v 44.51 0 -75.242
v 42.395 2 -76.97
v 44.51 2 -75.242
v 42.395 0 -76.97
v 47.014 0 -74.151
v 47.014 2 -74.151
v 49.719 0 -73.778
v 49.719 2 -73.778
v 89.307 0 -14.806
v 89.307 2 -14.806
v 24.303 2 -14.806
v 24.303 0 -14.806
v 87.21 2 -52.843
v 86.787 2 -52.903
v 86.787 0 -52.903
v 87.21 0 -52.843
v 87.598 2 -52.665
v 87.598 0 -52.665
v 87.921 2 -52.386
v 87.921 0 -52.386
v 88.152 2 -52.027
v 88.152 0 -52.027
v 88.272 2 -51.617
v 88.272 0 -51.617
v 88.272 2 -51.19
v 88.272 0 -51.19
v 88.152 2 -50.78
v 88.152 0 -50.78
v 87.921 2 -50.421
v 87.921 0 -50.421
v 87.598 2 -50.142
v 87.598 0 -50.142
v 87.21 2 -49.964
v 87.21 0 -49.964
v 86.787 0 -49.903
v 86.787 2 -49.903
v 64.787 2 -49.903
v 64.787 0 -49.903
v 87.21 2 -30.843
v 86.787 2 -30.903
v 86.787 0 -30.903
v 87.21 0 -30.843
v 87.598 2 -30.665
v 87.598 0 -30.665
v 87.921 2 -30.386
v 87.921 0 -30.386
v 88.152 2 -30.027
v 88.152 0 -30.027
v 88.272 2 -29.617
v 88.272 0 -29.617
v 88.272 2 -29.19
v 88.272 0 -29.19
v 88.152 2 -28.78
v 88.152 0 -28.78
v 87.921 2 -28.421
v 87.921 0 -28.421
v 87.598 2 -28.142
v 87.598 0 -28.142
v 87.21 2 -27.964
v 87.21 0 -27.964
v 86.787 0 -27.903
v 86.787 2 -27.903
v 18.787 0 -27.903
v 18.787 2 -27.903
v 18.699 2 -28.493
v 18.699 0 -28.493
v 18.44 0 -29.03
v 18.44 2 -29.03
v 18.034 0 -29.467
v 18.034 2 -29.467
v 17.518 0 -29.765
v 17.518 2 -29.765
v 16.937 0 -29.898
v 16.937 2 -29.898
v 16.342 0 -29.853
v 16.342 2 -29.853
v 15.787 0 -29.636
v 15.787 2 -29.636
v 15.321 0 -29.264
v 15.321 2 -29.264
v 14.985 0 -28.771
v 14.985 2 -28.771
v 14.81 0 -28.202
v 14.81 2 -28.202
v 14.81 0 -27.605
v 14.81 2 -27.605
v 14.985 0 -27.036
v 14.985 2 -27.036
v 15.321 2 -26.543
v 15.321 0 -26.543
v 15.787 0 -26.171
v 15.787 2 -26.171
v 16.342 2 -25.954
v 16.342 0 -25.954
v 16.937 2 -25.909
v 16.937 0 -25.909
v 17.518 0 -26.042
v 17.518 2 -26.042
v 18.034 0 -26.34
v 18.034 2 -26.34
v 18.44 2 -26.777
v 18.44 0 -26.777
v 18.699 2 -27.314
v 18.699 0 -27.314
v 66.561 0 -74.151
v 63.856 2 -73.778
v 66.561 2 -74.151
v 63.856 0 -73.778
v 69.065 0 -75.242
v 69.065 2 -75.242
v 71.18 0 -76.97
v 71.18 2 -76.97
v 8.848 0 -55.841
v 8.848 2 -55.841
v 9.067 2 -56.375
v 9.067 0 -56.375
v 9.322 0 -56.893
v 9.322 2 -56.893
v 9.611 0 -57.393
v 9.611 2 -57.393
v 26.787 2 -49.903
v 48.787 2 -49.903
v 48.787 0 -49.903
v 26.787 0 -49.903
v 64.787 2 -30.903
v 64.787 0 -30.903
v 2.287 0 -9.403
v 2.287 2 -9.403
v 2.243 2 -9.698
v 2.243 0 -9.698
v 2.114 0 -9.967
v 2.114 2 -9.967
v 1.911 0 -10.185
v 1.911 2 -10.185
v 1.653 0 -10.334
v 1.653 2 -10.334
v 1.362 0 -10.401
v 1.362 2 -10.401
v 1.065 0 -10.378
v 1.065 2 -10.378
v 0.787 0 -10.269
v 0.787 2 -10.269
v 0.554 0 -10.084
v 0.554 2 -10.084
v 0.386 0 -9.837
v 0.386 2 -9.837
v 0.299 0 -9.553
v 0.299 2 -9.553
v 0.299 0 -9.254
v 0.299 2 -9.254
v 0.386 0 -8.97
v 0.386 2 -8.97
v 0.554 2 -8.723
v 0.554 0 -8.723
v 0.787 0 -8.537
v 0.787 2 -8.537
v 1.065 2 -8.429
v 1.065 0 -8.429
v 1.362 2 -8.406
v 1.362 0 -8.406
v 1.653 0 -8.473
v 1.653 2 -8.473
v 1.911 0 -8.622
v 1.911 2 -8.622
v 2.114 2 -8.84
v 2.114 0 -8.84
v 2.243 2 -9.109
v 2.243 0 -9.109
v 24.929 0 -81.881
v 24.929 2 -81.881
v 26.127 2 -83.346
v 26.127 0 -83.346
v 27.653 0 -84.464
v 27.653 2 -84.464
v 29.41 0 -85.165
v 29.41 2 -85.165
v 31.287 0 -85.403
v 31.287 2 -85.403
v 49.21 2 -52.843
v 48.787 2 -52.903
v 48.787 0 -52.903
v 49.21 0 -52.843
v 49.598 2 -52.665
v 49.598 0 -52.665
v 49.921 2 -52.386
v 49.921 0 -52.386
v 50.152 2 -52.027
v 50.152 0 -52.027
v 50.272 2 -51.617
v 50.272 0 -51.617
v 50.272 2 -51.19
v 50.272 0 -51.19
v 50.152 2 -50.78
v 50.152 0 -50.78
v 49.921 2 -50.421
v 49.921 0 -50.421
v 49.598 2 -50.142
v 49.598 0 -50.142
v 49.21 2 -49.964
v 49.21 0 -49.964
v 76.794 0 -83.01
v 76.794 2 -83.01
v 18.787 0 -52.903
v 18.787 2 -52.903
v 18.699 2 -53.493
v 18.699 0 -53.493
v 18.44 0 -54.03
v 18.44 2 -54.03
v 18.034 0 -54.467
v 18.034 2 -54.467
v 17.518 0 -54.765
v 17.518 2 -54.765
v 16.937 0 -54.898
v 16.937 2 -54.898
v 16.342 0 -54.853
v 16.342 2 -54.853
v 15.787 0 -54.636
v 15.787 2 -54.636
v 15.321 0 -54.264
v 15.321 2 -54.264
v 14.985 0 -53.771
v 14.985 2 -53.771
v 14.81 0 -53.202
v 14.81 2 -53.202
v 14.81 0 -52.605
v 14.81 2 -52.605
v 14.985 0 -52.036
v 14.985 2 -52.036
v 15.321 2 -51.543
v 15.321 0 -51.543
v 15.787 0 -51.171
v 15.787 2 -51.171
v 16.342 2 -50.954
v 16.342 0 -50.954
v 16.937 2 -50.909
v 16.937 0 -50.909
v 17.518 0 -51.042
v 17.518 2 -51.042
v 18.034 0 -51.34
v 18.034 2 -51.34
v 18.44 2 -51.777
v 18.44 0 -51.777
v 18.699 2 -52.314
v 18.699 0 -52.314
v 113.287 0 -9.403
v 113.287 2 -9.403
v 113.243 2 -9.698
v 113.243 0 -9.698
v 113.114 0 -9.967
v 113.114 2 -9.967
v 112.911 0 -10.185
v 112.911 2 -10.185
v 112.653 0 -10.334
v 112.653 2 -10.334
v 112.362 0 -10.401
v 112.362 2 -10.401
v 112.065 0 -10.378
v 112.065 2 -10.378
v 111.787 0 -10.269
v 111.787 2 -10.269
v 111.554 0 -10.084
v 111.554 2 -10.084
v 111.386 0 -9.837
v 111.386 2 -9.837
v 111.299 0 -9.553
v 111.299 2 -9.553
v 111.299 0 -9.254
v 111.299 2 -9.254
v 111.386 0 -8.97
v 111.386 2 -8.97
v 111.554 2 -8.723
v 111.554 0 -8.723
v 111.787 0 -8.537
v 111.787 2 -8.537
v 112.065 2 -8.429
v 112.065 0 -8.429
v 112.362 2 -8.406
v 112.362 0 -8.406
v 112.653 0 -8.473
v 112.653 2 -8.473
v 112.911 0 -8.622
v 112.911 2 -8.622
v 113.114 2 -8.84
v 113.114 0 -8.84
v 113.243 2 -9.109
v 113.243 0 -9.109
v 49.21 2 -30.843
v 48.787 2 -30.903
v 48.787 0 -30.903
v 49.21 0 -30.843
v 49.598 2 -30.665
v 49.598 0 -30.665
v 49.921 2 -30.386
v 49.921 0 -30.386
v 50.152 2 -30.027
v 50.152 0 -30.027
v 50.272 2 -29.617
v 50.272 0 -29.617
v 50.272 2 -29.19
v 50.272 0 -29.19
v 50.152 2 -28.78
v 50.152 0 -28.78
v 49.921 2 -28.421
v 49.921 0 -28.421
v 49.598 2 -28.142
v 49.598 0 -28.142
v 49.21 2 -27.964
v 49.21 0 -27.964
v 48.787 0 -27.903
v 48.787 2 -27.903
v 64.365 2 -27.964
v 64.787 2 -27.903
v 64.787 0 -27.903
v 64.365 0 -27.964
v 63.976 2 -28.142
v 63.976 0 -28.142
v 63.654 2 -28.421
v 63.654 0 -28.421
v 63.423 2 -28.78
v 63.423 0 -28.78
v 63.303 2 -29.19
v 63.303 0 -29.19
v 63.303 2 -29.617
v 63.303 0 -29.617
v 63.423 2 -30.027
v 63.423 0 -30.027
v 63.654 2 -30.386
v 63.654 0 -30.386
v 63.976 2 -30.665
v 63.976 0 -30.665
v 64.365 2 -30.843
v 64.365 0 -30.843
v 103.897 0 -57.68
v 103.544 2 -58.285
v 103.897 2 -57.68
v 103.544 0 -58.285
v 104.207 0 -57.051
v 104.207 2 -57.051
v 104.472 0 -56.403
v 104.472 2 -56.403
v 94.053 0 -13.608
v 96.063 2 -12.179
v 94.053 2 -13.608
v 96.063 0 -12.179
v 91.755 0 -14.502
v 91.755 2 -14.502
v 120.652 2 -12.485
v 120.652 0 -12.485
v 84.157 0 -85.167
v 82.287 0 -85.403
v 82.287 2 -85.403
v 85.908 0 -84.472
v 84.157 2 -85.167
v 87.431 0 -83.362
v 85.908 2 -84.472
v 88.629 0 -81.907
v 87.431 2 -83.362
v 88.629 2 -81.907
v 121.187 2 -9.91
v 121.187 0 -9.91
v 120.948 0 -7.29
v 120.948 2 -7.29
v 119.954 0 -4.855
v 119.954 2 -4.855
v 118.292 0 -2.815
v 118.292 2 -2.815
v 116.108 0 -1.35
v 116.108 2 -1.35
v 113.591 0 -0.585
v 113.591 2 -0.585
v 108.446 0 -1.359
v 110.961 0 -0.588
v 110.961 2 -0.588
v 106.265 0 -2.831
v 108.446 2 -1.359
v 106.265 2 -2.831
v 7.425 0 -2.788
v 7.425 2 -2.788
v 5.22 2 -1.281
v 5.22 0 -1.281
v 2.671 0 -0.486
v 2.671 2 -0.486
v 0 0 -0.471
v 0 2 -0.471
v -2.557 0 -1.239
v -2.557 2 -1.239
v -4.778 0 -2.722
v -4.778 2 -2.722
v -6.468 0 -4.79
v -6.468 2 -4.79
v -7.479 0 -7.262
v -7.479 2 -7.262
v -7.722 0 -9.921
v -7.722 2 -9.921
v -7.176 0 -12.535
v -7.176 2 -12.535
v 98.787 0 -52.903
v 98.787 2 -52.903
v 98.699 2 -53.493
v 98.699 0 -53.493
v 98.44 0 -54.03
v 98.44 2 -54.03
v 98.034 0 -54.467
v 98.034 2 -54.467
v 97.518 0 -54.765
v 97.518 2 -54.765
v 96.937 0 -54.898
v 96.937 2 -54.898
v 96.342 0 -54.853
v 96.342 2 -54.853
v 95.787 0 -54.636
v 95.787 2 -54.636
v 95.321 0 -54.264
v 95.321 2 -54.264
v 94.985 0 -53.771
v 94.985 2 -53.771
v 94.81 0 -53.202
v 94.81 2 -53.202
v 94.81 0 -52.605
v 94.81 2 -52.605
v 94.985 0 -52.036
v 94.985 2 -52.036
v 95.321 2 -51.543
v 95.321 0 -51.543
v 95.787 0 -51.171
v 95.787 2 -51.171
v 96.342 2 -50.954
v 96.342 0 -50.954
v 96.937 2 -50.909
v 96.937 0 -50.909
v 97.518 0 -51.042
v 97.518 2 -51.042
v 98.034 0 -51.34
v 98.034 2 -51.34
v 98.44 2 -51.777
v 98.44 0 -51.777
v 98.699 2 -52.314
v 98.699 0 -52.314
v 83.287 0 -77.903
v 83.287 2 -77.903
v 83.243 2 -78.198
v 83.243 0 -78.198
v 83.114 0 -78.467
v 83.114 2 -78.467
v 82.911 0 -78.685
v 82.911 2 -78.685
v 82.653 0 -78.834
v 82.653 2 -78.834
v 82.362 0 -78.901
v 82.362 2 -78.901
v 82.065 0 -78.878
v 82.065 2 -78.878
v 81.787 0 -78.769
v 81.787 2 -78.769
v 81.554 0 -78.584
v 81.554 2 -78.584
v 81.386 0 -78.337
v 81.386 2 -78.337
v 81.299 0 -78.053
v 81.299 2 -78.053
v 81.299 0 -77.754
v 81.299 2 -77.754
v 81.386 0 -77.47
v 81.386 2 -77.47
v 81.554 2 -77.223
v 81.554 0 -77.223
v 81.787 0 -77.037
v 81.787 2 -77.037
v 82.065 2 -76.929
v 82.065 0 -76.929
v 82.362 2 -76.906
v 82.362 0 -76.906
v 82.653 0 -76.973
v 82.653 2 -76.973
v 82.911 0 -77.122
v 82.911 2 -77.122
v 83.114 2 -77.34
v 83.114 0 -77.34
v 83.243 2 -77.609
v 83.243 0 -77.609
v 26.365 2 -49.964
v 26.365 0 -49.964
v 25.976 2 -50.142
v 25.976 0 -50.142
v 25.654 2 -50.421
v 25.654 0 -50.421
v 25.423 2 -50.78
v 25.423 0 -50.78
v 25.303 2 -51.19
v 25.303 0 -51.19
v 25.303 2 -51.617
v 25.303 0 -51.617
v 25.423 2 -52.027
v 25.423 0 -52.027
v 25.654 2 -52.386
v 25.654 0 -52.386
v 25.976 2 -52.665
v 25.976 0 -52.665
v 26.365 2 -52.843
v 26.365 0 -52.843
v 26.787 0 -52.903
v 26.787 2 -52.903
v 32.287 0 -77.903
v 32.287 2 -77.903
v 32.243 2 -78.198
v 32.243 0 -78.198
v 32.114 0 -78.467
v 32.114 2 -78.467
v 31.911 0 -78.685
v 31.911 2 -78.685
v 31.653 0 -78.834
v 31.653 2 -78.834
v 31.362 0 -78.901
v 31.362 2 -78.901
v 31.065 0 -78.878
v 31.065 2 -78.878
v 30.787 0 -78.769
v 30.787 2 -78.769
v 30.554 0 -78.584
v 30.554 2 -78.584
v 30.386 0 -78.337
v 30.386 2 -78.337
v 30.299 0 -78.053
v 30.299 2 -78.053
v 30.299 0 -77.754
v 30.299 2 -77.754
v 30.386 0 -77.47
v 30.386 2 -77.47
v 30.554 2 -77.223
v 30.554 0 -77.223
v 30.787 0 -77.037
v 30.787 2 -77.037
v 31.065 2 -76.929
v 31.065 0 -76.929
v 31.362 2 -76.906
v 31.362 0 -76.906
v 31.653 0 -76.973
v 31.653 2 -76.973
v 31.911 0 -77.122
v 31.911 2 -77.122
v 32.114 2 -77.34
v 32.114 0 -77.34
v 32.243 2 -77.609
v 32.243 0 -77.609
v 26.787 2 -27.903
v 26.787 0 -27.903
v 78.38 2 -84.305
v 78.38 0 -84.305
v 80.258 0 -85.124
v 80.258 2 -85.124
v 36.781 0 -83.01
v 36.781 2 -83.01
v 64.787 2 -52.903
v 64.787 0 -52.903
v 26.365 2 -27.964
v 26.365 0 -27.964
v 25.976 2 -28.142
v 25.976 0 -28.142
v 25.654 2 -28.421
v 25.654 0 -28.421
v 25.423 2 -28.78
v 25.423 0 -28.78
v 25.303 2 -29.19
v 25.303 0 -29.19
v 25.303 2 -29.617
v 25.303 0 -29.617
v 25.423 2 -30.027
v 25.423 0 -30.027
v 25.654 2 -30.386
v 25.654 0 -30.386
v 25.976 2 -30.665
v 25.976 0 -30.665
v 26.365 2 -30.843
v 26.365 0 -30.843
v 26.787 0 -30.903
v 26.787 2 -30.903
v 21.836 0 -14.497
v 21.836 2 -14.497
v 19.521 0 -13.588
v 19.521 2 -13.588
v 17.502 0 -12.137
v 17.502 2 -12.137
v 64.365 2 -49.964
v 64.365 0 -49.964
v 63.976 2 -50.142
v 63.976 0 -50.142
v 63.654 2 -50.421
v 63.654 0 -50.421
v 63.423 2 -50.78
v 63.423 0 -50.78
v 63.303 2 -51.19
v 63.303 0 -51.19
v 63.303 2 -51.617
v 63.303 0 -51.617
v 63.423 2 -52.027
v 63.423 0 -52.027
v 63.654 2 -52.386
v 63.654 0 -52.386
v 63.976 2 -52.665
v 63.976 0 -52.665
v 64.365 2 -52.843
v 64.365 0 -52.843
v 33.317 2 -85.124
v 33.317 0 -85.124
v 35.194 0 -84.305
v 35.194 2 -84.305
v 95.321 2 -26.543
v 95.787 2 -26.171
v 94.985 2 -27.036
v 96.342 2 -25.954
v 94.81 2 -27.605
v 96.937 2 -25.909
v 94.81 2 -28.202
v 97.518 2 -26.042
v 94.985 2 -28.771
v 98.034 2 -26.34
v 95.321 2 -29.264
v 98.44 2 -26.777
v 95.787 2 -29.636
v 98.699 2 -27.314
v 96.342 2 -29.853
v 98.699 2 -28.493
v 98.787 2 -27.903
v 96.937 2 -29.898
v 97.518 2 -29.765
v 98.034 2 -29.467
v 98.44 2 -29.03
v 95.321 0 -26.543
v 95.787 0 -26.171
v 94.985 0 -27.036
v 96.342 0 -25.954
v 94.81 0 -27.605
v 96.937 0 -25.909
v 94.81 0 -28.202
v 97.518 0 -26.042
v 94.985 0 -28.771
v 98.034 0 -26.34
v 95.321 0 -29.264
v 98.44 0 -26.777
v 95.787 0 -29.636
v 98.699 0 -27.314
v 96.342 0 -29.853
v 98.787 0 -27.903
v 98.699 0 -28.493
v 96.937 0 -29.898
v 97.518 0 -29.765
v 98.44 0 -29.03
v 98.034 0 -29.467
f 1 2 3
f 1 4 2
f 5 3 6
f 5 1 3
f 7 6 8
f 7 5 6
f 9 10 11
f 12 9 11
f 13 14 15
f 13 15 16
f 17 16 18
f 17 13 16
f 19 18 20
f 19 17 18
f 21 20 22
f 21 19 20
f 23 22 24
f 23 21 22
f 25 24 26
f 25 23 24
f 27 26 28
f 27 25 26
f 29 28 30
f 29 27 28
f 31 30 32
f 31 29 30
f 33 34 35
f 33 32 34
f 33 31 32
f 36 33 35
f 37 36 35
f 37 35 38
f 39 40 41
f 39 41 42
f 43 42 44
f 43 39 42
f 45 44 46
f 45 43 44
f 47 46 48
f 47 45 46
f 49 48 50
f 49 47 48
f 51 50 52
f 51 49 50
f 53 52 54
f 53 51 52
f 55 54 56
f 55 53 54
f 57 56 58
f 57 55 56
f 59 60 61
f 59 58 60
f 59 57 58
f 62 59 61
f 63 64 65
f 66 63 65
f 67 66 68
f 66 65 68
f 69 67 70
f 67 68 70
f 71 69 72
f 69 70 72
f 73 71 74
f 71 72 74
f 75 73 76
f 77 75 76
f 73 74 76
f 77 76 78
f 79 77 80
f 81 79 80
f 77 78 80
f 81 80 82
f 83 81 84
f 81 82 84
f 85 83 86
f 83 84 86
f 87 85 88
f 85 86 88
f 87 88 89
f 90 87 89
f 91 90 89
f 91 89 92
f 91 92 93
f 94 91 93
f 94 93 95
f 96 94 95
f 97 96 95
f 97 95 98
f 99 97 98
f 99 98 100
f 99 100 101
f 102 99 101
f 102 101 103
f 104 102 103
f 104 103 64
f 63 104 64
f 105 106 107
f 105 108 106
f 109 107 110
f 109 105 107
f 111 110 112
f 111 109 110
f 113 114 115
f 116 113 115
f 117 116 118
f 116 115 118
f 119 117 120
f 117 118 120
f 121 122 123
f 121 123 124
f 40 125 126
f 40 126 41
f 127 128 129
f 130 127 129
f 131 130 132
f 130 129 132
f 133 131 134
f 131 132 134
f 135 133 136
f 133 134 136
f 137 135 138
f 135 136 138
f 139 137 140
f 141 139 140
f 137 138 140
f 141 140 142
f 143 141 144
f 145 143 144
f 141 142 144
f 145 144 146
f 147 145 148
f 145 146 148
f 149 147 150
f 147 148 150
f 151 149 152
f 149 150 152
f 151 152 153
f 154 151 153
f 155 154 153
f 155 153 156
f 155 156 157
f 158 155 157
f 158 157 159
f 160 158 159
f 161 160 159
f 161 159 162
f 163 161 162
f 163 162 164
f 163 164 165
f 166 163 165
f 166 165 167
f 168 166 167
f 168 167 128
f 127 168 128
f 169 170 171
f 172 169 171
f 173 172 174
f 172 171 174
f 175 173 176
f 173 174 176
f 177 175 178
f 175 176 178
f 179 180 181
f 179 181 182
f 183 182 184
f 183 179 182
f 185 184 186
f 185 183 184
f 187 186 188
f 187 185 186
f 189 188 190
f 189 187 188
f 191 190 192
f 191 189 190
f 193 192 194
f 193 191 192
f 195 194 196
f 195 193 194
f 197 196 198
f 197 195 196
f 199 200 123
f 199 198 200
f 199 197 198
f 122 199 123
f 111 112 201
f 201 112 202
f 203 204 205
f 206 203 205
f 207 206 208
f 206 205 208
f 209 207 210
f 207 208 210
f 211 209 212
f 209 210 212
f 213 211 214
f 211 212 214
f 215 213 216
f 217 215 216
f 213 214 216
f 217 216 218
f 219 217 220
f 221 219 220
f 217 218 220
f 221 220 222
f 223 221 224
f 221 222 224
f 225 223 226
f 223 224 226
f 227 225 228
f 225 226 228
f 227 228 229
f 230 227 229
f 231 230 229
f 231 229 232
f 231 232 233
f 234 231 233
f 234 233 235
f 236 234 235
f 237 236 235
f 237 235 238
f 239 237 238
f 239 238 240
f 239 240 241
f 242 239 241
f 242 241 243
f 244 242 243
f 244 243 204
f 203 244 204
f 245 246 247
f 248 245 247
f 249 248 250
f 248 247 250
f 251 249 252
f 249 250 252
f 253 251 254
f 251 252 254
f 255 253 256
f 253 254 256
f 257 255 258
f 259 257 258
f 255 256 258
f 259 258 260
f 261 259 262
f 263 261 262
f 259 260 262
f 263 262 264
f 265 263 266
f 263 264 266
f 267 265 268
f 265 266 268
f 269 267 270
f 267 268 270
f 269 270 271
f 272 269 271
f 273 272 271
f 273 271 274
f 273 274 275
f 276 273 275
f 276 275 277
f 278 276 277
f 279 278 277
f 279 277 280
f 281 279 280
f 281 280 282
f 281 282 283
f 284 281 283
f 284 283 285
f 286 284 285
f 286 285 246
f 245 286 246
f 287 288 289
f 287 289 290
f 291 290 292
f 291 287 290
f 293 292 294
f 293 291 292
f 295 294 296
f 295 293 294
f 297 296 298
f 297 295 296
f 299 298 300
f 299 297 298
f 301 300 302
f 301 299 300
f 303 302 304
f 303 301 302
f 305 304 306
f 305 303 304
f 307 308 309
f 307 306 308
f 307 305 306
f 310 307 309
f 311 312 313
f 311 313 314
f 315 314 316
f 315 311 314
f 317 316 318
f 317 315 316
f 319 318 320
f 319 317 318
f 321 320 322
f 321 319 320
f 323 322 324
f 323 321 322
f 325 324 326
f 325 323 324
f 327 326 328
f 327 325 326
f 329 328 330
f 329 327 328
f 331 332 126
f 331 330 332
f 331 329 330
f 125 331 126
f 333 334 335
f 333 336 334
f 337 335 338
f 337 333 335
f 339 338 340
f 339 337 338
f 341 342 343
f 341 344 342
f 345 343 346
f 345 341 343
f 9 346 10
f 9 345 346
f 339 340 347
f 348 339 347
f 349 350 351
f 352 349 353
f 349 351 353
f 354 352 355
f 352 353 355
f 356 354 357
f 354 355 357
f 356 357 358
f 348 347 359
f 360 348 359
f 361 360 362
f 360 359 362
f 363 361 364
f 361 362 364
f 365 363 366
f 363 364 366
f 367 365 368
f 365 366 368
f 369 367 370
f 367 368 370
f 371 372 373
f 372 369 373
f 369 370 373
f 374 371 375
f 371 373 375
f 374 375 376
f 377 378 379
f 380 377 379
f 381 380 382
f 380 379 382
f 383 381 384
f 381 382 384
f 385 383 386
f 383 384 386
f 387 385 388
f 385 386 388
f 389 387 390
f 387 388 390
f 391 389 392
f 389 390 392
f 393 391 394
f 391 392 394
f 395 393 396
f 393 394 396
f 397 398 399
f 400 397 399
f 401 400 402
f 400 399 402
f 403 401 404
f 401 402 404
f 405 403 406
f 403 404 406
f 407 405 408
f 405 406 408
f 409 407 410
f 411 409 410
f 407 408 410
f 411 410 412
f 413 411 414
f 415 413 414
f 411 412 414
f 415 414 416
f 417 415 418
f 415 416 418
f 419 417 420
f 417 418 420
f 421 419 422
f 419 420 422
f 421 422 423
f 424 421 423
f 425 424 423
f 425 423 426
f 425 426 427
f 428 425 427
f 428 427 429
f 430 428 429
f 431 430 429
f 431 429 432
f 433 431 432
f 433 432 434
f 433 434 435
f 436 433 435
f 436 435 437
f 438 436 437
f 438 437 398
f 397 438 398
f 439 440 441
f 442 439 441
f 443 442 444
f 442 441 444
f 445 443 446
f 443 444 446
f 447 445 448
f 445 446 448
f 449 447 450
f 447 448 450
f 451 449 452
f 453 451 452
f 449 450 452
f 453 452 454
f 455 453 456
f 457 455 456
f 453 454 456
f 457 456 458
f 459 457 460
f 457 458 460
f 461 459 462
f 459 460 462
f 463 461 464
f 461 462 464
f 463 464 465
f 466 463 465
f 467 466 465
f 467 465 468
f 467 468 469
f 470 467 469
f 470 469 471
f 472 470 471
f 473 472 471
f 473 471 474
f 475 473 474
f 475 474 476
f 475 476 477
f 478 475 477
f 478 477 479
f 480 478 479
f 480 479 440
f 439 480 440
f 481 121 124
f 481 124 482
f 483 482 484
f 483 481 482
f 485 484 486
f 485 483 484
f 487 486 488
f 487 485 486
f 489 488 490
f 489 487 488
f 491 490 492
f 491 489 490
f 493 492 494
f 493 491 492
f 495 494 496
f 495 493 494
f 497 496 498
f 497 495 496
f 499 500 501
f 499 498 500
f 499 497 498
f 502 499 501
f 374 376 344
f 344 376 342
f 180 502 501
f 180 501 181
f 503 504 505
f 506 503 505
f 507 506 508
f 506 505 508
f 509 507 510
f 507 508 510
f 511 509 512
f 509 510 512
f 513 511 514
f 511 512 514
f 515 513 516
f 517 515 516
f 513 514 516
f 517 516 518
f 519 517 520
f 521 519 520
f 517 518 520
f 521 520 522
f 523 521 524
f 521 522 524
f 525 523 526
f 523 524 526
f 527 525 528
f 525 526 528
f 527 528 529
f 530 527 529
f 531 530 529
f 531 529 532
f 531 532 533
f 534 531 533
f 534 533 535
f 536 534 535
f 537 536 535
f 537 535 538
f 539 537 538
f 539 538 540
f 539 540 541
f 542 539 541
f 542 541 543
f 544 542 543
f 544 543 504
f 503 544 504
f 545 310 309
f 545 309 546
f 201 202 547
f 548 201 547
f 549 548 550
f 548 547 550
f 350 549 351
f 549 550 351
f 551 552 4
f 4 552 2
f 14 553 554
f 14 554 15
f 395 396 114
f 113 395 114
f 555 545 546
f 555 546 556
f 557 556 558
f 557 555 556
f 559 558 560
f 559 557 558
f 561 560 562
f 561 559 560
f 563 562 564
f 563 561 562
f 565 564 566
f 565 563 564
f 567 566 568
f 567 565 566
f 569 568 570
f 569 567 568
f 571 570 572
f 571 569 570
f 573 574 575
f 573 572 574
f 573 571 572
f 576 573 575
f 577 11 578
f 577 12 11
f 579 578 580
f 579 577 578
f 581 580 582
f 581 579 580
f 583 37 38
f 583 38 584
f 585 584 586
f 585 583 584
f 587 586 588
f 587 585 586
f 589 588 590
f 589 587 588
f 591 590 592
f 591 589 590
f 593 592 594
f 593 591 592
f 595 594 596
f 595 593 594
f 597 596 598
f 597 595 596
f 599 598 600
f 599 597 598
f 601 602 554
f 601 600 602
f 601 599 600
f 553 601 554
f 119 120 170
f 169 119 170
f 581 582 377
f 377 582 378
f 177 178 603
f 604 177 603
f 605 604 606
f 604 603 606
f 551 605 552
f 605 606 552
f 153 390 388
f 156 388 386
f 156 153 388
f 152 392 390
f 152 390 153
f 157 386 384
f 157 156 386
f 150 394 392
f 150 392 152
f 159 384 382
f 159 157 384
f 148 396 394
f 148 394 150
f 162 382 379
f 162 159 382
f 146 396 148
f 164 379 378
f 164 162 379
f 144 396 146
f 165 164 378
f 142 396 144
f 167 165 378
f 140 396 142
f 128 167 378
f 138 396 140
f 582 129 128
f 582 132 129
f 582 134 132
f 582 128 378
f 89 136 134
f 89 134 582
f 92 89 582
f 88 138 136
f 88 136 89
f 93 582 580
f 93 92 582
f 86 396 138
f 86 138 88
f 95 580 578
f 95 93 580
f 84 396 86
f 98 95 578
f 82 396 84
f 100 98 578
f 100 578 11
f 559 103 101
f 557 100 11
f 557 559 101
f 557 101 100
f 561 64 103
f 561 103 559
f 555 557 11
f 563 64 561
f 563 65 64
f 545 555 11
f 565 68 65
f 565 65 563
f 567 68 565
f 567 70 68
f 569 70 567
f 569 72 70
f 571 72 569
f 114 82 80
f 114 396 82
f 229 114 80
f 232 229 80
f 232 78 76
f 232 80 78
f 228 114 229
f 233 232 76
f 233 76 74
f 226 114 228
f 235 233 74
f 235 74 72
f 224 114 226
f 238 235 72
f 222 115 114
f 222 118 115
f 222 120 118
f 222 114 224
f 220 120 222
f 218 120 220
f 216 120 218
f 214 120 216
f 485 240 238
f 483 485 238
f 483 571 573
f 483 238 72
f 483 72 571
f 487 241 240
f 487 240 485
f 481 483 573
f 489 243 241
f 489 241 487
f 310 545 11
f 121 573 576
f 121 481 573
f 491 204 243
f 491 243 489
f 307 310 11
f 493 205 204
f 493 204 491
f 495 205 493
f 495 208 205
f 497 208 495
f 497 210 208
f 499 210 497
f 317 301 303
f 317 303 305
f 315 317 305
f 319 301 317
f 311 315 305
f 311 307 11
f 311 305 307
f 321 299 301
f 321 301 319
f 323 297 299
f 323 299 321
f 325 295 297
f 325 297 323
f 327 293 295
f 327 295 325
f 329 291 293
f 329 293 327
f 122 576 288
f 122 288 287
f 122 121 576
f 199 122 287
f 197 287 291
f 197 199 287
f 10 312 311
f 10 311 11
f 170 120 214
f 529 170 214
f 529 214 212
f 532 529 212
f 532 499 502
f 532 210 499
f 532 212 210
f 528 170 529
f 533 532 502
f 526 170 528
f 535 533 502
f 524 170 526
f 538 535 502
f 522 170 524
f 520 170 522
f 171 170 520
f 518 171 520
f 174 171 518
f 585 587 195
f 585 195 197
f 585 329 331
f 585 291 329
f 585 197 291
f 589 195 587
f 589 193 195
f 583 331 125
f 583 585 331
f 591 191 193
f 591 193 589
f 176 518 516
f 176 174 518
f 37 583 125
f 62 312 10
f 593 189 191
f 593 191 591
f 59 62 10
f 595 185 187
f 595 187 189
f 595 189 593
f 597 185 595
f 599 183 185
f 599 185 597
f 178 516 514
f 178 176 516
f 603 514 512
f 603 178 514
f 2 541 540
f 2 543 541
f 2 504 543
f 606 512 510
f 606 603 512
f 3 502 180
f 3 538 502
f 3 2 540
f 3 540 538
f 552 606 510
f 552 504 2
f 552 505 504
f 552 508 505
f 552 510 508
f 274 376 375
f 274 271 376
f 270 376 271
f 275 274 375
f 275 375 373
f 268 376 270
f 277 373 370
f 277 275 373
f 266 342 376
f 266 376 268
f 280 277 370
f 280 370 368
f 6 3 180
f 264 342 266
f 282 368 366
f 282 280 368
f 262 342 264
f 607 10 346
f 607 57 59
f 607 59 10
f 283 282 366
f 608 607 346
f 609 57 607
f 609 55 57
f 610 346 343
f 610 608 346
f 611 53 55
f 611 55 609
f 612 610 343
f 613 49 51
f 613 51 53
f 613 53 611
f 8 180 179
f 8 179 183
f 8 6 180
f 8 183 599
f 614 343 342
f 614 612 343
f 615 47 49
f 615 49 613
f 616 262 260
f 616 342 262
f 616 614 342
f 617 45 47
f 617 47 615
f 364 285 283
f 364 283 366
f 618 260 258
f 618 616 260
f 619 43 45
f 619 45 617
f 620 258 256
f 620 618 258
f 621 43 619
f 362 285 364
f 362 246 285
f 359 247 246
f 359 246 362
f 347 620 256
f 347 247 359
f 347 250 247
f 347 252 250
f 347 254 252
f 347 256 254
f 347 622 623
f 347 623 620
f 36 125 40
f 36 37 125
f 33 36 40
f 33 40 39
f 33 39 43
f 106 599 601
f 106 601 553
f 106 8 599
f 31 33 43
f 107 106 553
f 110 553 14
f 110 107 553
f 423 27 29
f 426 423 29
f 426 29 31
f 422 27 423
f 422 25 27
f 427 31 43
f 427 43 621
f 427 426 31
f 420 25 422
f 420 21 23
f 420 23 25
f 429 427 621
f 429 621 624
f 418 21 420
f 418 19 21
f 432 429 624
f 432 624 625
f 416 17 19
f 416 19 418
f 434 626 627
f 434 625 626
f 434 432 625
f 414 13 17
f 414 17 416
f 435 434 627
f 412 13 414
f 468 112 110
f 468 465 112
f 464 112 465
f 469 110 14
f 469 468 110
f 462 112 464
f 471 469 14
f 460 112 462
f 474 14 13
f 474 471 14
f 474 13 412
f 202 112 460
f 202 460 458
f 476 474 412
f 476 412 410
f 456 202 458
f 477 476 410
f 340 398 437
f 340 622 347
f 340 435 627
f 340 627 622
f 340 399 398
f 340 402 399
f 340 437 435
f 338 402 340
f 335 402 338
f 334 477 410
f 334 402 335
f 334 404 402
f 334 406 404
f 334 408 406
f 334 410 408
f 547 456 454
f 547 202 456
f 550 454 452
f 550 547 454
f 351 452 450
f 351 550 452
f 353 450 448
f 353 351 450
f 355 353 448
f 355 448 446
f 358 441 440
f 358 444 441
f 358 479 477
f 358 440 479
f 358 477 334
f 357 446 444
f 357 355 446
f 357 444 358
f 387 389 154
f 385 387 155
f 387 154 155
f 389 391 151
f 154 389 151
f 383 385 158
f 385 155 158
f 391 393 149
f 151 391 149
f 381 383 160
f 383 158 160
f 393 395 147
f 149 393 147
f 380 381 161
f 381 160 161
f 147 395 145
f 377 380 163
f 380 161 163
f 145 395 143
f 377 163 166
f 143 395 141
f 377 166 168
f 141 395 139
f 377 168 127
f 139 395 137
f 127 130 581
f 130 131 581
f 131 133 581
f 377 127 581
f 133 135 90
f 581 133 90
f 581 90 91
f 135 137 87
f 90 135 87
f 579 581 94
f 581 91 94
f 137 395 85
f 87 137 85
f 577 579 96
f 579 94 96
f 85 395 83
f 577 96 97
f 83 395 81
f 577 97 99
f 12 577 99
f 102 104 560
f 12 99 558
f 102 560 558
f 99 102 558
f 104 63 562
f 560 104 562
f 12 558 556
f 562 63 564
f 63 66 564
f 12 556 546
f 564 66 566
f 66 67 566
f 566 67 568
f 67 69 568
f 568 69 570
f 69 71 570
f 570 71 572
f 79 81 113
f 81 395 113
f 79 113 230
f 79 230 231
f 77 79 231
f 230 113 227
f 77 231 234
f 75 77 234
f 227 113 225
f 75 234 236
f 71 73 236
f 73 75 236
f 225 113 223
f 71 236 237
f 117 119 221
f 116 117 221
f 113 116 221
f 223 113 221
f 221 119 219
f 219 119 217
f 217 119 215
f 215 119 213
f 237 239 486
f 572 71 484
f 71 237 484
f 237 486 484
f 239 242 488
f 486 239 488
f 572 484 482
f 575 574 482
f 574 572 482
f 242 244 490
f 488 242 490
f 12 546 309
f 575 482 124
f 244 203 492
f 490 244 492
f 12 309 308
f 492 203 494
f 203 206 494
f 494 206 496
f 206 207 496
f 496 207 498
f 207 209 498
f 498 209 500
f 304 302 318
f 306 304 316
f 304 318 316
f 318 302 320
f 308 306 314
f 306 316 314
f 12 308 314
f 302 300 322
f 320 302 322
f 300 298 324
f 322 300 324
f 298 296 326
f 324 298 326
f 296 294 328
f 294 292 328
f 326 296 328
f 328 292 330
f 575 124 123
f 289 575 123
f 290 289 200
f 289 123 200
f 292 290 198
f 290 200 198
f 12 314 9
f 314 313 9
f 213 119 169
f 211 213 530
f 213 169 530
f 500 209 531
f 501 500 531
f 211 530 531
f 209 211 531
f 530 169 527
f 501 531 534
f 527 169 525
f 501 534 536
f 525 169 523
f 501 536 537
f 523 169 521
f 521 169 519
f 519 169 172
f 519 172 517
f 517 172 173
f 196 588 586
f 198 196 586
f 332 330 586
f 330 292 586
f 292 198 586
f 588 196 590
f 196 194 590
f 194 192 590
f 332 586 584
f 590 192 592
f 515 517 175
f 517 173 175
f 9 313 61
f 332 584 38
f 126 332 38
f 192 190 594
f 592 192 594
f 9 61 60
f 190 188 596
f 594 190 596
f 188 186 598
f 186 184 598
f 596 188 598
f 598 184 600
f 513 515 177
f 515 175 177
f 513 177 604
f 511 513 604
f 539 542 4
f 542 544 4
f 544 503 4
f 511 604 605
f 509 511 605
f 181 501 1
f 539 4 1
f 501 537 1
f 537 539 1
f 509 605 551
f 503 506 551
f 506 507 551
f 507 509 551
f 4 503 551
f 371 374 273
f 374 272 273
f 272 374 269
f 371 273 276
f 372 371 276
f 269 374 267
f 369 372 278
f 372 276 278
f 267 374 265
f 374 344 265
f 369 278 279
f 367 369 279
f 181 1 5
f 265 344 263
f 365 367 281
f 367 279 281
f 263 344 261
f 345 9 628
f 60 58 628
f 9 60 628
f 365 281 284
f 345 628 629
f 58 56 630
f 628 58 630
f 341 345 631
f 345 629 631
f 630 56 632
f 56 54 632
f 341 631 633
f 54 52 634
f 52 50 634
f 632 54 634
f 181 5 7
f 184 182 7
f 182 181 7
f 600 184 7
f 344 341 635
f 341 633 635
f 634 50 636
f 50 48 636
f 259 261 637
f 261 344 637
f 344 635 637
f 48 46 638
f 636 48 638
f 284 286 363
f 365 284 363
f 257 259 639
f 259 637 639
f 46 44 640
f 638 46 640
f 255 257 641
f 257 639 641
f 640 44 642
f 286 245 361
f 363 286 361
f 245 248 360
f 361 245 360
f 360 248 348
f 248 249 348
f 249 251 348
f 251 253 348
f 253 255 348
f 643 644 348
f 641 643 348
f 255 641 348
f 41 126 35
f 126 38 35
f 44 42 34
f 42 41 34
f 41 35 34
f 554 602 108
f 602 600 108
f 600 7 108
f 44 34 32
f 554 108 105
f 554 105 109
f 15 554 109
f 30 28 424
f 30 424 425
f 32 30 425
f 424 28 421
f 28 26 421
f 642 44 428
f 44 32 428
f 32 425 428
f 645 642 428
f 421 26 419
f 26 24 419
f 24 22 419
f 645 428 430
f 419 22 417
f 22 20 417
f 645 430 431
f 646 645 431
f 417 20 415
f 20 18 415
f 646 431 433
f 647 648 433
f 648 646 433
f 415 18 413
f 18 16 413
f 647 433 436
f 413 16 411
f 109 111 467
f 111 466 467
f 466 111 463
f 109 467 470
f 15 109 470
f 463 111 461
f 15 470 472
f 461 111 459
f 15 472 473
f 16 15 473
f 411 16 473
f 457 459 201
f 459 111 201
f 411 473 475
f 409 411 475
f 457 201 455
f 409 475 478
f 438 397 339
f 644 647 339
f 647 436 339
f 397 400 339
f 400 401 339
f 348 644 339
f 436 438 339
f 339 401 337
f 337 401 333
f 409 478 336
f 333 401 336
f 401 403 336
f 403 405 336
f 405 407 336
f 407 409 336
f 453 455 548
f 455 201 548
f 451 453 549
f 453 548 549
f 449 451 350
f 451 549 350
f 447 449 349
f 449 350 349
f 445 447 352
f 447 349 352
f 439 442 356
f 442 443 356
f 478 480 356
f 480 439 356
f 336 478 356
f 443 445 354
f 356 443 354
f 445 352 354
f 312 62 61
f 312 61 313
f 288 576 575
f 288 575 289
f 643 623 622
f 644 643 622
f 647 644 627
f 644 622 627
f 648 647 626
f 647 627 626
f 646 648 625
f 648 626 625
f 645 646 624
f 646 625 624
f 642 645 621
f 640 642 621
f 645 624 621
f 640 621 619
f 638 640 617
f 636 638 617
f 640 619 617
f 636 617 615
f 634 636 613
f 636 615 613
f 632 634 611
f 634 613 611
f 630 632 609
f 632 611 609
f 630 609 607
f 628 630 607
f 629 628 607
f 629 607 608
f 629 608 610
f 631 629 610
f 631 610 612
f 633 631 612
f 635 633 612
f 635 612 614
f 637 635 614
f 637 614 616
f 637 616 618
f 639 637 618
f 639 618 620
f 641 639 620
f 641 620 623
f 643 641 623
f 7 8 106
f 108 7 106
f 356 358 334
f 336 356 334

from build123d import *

# Parameters (mm, degrees)
SKETCH1_W           = 130
SKETCH1_H           = 90
BOSS_EXTRUDE2_DEPTH = 2
SKETCH2_R           = 2
CUT_EXTRUDE1_DEPTH  = 10
CUT_EXTRUDE3_DEPTH  = 10
SKETCH5_R           = 1
CUT_EXTRUDE4_DEPTH  = 10
CUT_EXTRUDE5_DEPTH  = 3
FILLET1_R           = 10


with BuildPart() as part:
    # Sketch1 → Boss-Extrude2 (new body)
    with BuildSketch(Plane(origin=(0, 0, 0), x_dir=(1, 0, 0), z_dir=(0, 1, 0))):
        with Locations((56.787418592, 40.403463793)):
            Rectangle(SKETCH1_W, SKETCH1_H)
    extrude(amount=BOSS_EXTRUDE2_DEPTH)

    # Sketch2 → Cut-Extrude1 (cut)
    with BuildSketch(Plane(origin=(0, 2, 0), x_dir=(1, 0, 0), z_dir=(0, 1, 0))):
        with Locations((16.787418592, 52.903463793)):
            Circle(SKETCH2_R)
        with Locations((16.787418592, 27.903463793)):
            Circle(SKETCH2_R)
        with Locations((96.787418592, 52.903463793)):
            Circle(SKETCH2_R)
        with Locations((96.787418592, 27.903463793)):
            Circle(SKETCH2_R)
    extrude(amount=-CUT_EXTRUDE1_DEPTH, mode=Mode.SUBTRACT)

    # Sketch4 → Cut-Extrude3 (cut)
    with BuildSketch(Plane(origin=(0, 2, 0), x_dir=(1, 0, 0), z_dir=(0, 1, 0))):
        with BuildLine():
            Line((26.787418592, 52.903463793), (48.787418592, 52.903463793))
            ThreePointArc((48.787418592, 52.903463793), (50.287418592, 51.403463793), (48.787418592, 49.903463793))
            Line((48.787418592, 49.903463793), (26.787418592, 49.903463793))
            ThreePointArc((26.787418592, 49.903463793), (25.287418592, 51.403463793), (26.787418592, 52.903463793))
        make_face()
        with BuildLine():
            Line((26.787418592, 30.903463793), (48.787418592, 30.903463793))
            ThreePointArc((48.787418592, 30.903463793), (50.287418592, 29.403463793), (48.787418592, 27.903463793))
            Line((48.787418592, 27.903463793), (26.787418592, 27.903463793))
            ThreePointArc((26.787418592, 27.903463793), (25.287418592, 29.403463793), (26.787418592, 30.903463793))
        make_face()
        with BuildLine():
            Line((64.787418592, 52.903463793), (86.787418592, 52.903463793))
            ThreePointArc((86.787418592, 52.903463793), (88.287418592, 51.403463793), (86.787418592, 49.903463793))
            Line((86.787418592, 49.903463793), (64.787418592, 49.903463793))
            ThreePointArc((64.787418592, 49.903463793), (63.287418592, 51.403463793), (64.787418592, 52.903463793))
        make_face()
        with BuildLine():
            Line((64.787418592, 30.903463793), (86.787418592, 30.903463793))
            ThreePointArc((86.787418592, 30.903463793), (88.287418592, 29.403463793), (86.787418592, 27.903463793))
            Line((86.787418592, 27.903463793), (64.787418592, 27.903463793))
            ThreePointArc((64.787418592, 27.903463793), (63.287418592, 29.403463793), (64.787418592, 30.903463793))
        make_face()
    extrude(amount=-CUT_EXTRUDE3_DEPTH, mode=Mode.SUBTRACT)

    # Sketch5 → Cut-Extrude4 (cut)
    with BuildSketch(Plane(origin=(0, 2, 0), x_dir=(1, 0, 0), z_dir=(0, 1, 0))):
        with Locations((1.287418592, 9.403463793)):
            Circle(SKETCH5_R)
        with Locations((112.287418592, 9.403463793)):
            Circle(SKETCH5_R)
        with Locations((31.287418592, 77.903463793)):
            Circle(SKETCH5_R)
        with Locations((82.287418592, 77.903463793)):
            Circle(SKETCH5_R)
    extrude(amount=-CUT_EXTRUDE4_DEPTH, mode=Mode.SUBTRACT)

    # Sketch6 → Cut-Extrude5 (cut, through all)
    with BuildSketch(Plane(origin=(0, 2, 0), x_dir=(1, 0, 0), z_dir=(0, 1, 0))):
        with BuildLine():
            Line((31.287418742, 85.403463793), (-8.212581408, 85.403463793))
            Line((-8.212581408, 85.403463793), (-8.212581408, -4.596536207))
            Line((-8.212581408, -4.596536207), (121.787418592, -4.596536207))
            Line((121.787418592, -4.596536207), (121.787418592, 85.403463793))
            Line((121.787418592, 85.403463793), (82.287418592, 85.403463793))
            ThreePointArc((82.287418592, 85.403463793), (85.908182742, 84.471573641), (88.629172371, 81.907481652))
            Line((88.629172371, 81.907481652), (104.107184656, 57.392670192))
            Line((104.107184656, 57.392670192), (120.652052771, 12.485171021))
            ThreePointArc((120.652052771, 12.485171021), (117.254615926, 2.001371181), (106.265325845, 2.830913046))
            Line((106.265325845, 2.830913046), (93.195977552, 14.805689748))
            Line((93.195977552, 14.805689748), (20.378859632, 14.805689748))
            Line((20.378859632, 14.805689748), (7.425097101, 2.787815466))
            ThreePointArc((7.425097103, 2.787815464), (-3.723088928, 1.897951505), (-7.176040156, 12.53519915))
            Line((-7.176040154, 12.53519915), (8.848458195, 55.841119114))
            ThreePointArc((8.848458195, 55.841119114), (9.189915505, 56.63640604), (9.610794254, 57.392670192))
            Line((9.610794254, 57.392670192), (24.928951385, 81.880886929))
            ThreePointArc((24.928951386, 81.880886928), (27.652908616, 84.463977282), (31.287418742, 85.403463793))
        make_face()
        with BuildLine():
            Line((82.287418592, 85.403463793), (31.287418742, 85.403463793))
            ThreePointArc((31.287418742, 85.403463793), (34.283566796, 84.779007113), (36.780790962, 83.00962282))
            Line((36.780790963, 83.009622821), (45.361476392, 73.77824166))
            Line((45.361476392, 73.77824166), (68.213360792, 73.77824166))
            Line((68.213360792, 73.77824166), (76.794046223, 83.009622821))
            ThreePointArc((76.794046223, 83.009622821), (79.291270457, 84.779007143), (82.287418592, 85.403463793))
        make_face()
    extrude(amount=-CUT_EXTRUDE5_DEPTH, mode=Mode.SUBTRACT)

    # Fillet1
    fillet1_edges = [part.edges().sort_by_distance(p)[0] for p in [
        (68.213360792, 1, -73.77824166),
        (45.361476392, 1, -73.77824166),
        (20.378859632, 1, -14.805689748),
        (93.195977552, 1, -14.805689748),
        (104.107184656, 1, -57.392670192),
    ]]
    fillet(fillet1_edges, radius=FILLET1_R)


solid = part.part
